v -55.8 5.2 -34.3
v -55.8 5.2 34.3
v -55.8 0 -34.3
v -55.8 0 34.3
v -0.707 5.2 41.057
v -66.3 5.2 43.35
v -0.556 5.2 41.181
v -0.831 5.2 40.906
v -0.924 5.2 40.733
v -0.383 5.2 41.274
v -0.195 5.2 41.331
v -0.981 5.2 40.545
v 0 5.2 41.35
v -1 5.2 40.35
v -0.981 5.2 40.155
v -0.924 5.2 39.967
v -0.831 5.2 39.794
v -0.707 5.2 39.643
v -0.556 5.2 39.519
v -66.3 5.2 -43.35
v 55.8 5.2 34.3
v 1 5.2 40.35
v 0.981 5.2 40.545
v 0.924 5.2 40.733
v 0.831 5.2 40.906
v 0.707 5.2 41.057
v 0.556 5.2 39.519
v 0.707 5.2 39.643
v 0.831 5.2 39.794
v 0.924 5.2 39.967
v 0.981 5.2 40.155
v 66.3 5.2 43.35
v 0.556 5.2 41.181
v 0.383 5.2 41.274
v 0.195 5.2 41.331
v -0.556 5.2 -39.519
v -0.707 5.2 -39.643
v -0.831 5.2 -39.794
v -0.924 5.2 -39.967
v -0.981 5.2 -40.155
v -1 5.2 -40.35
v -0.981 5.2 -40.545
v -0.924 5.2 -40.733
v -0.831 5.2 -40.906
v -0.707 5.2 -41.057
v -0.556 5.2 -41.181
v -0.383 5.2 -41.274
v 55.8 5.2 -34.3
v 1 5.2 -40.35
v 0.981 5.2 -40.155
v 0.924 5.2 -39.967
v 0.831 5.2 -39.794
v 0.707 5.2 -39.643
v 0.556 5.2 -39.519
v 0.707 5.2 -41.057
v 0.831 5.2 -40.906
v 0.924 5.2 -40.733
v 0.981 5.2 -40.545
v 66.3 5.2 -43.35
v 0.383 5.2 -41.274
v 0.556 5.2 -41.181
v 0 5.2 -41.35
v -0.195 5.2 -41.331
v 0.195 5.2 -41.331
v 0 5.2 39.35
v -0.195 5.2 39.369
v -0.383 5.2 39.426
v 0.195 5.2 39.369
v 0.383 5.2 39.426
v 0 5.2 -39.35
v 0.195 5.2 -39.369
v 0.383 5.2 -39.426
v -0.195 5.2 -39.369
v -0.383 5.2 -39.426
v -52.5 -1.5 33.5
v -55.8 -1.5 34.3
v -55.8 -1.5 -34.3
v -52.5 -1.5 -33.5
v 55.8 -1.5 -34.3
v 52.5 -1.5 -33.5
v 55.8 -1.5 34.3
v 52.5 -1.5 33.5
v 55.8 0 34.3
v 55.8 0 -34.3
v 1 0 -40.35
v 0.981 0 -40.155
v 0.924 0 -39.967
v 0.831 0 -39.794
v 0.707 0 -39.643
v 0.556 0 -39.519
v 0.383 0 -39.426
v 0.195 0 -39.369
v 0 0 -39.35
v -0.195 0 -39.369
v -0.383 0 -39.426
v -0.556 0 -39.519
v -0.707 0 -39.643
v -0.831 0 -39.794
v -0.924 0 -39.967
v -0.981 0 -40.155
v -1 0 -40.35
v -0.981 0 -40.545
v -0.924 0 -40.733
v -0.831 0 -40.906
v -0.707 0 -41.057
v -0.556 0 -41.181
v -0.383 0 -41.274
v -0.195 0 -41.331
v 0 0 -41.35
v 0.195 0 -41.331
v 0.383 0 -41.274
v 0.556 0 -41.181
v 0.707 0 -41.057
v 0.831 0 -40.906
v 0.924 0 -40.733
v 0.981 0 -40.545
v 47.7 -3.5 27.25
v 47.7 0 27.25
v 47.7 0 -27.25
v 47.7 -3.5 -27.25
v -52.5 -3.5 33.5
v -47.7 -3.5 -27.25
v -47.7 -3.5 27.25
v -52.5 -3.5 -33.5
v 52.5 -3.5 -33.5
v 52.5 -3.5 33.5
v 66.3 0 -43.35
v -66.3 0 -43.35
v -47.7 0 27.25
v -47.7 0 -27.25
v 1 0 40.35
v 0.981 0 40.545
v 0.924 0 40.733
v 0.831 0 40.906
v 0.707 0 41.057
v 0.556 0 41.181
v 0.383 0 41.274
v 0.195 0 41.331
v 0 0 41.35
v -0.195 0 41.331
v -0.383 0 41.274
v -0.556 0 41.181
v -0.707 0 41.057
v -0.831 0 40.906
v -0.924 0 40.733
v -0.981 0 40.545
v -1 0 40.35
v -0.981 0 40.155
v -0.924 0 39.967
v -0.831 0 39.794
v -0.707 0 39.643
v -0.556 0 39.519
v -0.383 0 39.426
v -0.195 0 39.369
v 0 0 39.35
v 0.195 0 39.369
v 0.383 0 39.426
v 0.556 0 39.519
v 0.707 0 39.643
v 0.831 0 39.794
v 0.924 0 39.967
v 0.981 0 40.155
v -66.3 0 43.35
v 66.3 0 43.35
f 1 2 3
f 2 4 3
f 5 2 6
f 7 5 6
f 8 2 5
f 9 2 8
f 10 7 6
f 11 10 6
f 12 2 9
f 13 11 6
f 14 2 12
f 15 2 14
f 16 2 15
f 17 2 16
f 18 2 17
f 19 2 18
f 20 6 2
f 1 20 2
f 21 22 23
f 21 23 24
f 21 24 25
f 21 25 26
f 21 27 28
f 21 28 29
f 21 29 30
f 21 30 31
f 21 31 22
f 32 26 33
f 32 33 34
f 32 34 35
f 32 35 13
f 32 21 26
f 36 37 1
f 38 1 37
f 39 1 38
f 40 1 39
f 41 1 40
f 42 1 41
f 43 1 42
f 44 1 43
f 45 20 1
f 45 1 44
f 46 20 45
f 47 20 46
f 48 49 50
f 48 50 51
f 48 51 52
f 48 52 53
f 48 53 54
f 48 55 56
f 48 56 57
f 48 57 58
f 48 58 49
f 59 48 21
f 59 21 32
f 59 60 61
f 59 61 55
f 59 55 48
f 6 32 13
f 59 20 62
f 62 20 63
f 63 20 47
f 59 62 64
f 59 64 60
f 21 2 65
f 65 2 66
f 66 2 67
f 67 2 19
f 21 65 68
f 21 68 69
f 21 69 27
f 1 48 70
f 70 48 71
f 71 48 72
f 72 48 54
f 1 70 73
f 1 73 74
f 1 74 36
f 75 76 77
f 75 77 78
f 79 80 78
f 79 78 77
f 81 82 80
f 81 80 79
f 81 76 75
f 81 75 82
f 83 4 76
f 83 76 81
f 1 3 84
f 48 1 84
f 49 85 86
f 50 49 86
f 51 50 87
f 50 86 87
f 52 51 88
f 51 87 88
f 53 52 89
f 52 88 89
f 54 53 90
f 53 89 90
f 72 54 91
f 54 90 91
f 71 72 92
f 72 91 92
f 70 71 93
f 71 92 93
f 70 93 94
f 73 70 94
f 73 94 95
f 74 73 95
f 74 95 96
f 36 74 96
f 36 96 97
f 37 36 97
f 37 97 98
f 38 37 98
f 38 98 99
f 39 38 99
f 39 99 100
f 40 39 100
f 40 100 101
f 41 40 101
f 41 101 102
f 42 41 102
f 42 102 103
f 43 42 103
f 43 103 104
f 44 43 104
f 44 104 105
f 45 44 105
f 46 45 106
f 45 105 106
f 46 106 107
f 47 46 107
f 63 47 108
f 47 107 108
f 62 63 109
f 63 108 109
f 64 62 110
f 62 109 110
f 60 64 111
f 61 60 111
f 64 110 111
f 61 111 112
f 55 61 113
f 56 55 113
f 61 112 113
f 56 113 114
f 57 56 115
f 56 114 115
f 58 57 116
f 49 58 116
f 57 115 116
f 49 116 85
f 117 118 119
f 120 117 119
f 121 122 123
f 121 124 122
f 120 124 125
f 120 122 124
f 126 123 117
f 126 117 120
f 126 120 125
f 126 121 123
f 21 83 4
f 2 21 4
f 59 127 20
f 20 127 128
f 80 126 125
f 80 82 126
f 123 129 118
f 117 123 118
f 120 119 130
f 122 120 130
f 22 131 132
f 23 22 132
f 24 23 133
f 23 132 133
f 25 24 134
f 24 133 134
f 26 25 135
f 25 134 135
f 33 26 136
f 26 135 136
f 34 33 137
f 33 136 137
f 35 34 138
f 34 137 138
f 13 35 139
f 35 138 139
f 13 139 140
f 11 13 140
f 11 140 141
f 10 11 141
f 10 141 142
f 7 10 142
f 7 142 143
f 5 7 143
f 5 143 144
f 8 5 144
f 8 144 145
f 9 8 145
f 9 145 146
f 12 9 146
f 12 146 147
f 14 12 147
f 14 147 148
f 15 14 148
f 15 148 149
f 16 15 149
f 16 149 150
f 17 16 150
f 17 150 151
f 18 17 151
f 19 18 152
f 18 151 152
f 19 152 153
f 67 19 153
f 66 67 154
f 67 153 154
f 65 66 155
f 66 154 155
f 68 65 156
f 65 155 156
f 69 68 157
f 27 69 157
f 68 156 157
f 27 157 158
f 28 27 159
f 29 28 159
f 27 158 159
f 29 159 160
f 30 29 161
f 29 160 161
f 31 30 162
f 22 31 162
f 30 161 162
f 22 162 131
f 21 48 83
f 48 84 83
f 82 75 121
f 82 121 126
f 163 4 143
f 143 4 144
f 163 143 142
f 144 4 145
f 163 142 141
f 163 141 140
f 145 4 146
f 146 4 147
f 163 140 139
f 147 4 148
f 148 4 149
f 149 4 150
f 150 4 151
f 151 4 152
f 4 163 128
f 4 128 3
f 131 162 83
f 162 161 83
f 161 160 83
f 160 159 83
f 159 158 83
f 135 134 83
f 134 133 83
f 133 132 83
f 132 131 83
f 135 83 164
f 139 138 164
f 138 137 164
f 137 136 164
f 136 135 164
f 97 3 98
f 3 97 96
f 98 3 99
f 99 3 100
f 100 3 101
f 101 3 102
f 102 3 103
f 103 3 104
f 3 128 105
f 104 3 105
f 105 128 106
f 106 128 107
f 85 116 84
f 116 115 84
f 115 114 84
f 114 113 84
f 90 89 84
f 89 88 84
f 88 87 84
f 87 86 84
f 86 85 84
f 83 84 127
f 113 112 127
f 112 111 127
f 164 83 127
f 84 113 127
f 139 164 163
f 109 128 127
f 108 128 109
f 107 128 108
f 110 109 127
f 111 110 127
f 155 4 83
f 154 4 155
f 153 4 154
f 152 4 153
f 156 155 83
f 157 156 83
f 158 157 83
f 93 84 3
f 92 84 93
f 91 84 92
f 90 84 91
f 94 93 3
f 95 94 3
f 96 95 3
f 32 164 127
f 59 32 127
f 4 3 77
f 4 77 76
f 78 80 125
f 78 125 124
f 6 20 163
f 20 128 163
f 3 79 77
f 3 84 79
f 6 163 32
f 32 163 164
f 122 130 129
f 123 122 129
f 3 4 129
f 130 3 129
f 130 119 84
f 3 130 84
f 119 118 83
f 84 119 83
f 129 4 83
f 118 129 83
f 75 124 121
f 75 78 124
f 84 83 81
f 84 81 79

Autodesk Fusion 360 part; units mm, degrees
sketch "Sketch1" plane through (0, 0, 0) normal (0, 1, 0) x (1, 0, 0)
  line L0 (55.8, -34.3) -> (-55.8, -34.3)
  line L1 (-55.8, -34.3) -> (-55.8, 34.3)
  line L2 (-55.8, 34.3) -> (55.8, 34.3)
  line L3 (55.8, 34.3) -> (55.8, -34.3)
  line L4 (55.8, -34.3) -> (-55.8, 34.3) construction
  line L5 (-55.8, -34.3) -> (55.8, 34.3) construction
  line L6 (-66.3, -43.35) -> (66.3, -43.35)
  line L7 (66.3, -43.35) -> (66.3, 43.35)
  line L8 (66.3, 43.35) -> (-66.3, 43.35)
  line L9 (-66.3, 43.35) -> (-66.3, -43.35)
  line L10 (-66.3, -43.35) -> (66.3, 43.35) construction
  line L11 (66.3, -43.35) -> (-66.3, 43.35) construction
  circle A0 centre (0, -40.35) radius 1
  circle A1 centre (0, 40.35) radius 1
  point P0 (0, 40.35)
  dimension "d1" = 111.6
  dimension "d2" = 68.6
  dimension "d3" = 132.6
  dimension "d4" = 86.7
  dimension "d12" = 2
  dimension "d13" = 2
extrude "Extrude1" add sketch "Sketch1" along normal blind 5.2 contours L6 L7 L8 L9 | A0 | A1
extrude "Extrude3" cut sketch "Sketch1" along normal blind 20 contours A0 | A1
sketch "Sketch2" plane through (0, 0, 0) normal (0, -1, 0) x (1, 0, 0)
  circle A0 centre (0, -40.35) radius 1
  circle A1 centre (0, 40.35) radius 1
  line L0 (55.8, -34.3) -> (-55.8, -34.3)
  line L1 (-55.8, -34.3) -> (-55.8, 34.3)
  line L2 (-55.8, 34.3) -> (55.8, 34.3)
  line L3 (55.8, 34.3) -> (55.8, -34.3)
  line L4 (-66.3, 43.35) -> (-66.3, -43.35)
  line L5 (-66.3, -43.35) -> (66.3, -43.35)
  line L6 (66.3, -43.35) -> (66.3, 43.35)
  line L7 (66.3, 43.35) -> (-66.3, 43.35)
  line L8 (-47.7, 27.25) -> (47.7, 27.25)
  line L9 (47.7, 27.25) -> (47.7, -27.25)
  line L10 (47.7, -27.25) -> (-47.7, -27.25)
  line L11 (-47.7, -27.25) -> (-47.7, 27.25)
  line L12 (-47.7, 27.25) -> (47.7, -27.25) construction
  line L13 (47.7, 27.25) -> (-47.7, -27.25) construction
  dimension "d16" = 95.4
  dimension "d17" = 54.5
extrude "Extrude4" add sketch "Sketch2" along normal blind 3 contours L0 L1 L2 L3
sketch "Sketch3" plane through (0, 0, 0) normal (0, 1, 0) x (1, 0, 0)
sketch "Sketch4" plane through (0, -3, 0) normal (0, -1, 0) x (1, 0, 0)
  line L0 (47.7, -27.25) -> (-47.7, -27.25)
  line L1 (-47.7, -27.25) -> (-47.7, 27.25)
  line L2 (-47.7, 27.25) -> (47.7, 27.25)
  line L3 (47.7, 27.25) -> (47.7, -27.25)
  line L4 (55.8, 34.3) -> (-55.8, 34.3)
  line L5 (-55.8, 34.3) -> (-55.8, -34.3)
  line L6 (-55.8, -34.3) -> (55.8, -34.3)
  line L7 (55.8, -34.3) -> (55.8, 34.3)
  line L8 (-52.5, 33.5) -> (52.5, 33.5)
  line L9 (52.5, 33.5) -> (52.5, -33.5)
  line L10 (52.5, -33.5) -> (-52.5, -33.5)
  line L11 (-52.5, -33.5) -> (-52.5, 33.5)
  line L12 (-52.5, 33.5) -> (52.5, -33.5) construction
  line L13 (52.5, 33.5) -> (-52.5, -33.5) construction
  dimension "d20" = 105
  dimension "d21" = 67
extrude "Extrude5" cut 1 faces at (53.1, -3, -9.0833) along direction (0, 1, 0) blind 1.5
sketch "Sketch5" plane through (0, -1.5, 0) normal (0, -1, 0) x (1, 0, 0)
  line L0 (47.7, -27.25) -> (-47.7, -27.25)
  line L1 (-47.7, -27.25) -> (-47.7, 27.25)
  line L2 (-47.7, 27.25) -> (47.7, 27.25)
  line L3 (47.7, 27.25) -> (47.7, -27.25)
  line L4 (55.8, 34.3) -> (-55.8, 34.3)
  line L5 (-55.8, 34.3) -> (-55.8, -34.3)
  line L6 (-55.8, -34.3) -> (55.8, -34.3)
  line L7 (55.8, -34.3) -> (55.8, 34.3)
  line L8 (52.5, 33.5) -> (-52.5, 33.5)
  line L9 (-52.5, 33.5) -> (-52.5, -33.5)
  line L10 (-52.5, -33.5) -> (52.5, -33.5)
  line L11 (52.5, -33.5) -> (52.5, 33.5)
  line L12 (52.5, 33.5) -> (-52.5, -33.5) construction
  line L13 (-52.5, 33.5) -> (52.5, -33.5) construction
  dimension "d24" = 105
  dimension "d25" = 67
extrude "Extrude6" add sketch "Sketch4" against normal blind 2 contours L8 L9 L10 L11
extrude "Extrude8" add 1 faces at (15.9, -3, -31.4167) along direction (0, -1, 0) blind 0.5
